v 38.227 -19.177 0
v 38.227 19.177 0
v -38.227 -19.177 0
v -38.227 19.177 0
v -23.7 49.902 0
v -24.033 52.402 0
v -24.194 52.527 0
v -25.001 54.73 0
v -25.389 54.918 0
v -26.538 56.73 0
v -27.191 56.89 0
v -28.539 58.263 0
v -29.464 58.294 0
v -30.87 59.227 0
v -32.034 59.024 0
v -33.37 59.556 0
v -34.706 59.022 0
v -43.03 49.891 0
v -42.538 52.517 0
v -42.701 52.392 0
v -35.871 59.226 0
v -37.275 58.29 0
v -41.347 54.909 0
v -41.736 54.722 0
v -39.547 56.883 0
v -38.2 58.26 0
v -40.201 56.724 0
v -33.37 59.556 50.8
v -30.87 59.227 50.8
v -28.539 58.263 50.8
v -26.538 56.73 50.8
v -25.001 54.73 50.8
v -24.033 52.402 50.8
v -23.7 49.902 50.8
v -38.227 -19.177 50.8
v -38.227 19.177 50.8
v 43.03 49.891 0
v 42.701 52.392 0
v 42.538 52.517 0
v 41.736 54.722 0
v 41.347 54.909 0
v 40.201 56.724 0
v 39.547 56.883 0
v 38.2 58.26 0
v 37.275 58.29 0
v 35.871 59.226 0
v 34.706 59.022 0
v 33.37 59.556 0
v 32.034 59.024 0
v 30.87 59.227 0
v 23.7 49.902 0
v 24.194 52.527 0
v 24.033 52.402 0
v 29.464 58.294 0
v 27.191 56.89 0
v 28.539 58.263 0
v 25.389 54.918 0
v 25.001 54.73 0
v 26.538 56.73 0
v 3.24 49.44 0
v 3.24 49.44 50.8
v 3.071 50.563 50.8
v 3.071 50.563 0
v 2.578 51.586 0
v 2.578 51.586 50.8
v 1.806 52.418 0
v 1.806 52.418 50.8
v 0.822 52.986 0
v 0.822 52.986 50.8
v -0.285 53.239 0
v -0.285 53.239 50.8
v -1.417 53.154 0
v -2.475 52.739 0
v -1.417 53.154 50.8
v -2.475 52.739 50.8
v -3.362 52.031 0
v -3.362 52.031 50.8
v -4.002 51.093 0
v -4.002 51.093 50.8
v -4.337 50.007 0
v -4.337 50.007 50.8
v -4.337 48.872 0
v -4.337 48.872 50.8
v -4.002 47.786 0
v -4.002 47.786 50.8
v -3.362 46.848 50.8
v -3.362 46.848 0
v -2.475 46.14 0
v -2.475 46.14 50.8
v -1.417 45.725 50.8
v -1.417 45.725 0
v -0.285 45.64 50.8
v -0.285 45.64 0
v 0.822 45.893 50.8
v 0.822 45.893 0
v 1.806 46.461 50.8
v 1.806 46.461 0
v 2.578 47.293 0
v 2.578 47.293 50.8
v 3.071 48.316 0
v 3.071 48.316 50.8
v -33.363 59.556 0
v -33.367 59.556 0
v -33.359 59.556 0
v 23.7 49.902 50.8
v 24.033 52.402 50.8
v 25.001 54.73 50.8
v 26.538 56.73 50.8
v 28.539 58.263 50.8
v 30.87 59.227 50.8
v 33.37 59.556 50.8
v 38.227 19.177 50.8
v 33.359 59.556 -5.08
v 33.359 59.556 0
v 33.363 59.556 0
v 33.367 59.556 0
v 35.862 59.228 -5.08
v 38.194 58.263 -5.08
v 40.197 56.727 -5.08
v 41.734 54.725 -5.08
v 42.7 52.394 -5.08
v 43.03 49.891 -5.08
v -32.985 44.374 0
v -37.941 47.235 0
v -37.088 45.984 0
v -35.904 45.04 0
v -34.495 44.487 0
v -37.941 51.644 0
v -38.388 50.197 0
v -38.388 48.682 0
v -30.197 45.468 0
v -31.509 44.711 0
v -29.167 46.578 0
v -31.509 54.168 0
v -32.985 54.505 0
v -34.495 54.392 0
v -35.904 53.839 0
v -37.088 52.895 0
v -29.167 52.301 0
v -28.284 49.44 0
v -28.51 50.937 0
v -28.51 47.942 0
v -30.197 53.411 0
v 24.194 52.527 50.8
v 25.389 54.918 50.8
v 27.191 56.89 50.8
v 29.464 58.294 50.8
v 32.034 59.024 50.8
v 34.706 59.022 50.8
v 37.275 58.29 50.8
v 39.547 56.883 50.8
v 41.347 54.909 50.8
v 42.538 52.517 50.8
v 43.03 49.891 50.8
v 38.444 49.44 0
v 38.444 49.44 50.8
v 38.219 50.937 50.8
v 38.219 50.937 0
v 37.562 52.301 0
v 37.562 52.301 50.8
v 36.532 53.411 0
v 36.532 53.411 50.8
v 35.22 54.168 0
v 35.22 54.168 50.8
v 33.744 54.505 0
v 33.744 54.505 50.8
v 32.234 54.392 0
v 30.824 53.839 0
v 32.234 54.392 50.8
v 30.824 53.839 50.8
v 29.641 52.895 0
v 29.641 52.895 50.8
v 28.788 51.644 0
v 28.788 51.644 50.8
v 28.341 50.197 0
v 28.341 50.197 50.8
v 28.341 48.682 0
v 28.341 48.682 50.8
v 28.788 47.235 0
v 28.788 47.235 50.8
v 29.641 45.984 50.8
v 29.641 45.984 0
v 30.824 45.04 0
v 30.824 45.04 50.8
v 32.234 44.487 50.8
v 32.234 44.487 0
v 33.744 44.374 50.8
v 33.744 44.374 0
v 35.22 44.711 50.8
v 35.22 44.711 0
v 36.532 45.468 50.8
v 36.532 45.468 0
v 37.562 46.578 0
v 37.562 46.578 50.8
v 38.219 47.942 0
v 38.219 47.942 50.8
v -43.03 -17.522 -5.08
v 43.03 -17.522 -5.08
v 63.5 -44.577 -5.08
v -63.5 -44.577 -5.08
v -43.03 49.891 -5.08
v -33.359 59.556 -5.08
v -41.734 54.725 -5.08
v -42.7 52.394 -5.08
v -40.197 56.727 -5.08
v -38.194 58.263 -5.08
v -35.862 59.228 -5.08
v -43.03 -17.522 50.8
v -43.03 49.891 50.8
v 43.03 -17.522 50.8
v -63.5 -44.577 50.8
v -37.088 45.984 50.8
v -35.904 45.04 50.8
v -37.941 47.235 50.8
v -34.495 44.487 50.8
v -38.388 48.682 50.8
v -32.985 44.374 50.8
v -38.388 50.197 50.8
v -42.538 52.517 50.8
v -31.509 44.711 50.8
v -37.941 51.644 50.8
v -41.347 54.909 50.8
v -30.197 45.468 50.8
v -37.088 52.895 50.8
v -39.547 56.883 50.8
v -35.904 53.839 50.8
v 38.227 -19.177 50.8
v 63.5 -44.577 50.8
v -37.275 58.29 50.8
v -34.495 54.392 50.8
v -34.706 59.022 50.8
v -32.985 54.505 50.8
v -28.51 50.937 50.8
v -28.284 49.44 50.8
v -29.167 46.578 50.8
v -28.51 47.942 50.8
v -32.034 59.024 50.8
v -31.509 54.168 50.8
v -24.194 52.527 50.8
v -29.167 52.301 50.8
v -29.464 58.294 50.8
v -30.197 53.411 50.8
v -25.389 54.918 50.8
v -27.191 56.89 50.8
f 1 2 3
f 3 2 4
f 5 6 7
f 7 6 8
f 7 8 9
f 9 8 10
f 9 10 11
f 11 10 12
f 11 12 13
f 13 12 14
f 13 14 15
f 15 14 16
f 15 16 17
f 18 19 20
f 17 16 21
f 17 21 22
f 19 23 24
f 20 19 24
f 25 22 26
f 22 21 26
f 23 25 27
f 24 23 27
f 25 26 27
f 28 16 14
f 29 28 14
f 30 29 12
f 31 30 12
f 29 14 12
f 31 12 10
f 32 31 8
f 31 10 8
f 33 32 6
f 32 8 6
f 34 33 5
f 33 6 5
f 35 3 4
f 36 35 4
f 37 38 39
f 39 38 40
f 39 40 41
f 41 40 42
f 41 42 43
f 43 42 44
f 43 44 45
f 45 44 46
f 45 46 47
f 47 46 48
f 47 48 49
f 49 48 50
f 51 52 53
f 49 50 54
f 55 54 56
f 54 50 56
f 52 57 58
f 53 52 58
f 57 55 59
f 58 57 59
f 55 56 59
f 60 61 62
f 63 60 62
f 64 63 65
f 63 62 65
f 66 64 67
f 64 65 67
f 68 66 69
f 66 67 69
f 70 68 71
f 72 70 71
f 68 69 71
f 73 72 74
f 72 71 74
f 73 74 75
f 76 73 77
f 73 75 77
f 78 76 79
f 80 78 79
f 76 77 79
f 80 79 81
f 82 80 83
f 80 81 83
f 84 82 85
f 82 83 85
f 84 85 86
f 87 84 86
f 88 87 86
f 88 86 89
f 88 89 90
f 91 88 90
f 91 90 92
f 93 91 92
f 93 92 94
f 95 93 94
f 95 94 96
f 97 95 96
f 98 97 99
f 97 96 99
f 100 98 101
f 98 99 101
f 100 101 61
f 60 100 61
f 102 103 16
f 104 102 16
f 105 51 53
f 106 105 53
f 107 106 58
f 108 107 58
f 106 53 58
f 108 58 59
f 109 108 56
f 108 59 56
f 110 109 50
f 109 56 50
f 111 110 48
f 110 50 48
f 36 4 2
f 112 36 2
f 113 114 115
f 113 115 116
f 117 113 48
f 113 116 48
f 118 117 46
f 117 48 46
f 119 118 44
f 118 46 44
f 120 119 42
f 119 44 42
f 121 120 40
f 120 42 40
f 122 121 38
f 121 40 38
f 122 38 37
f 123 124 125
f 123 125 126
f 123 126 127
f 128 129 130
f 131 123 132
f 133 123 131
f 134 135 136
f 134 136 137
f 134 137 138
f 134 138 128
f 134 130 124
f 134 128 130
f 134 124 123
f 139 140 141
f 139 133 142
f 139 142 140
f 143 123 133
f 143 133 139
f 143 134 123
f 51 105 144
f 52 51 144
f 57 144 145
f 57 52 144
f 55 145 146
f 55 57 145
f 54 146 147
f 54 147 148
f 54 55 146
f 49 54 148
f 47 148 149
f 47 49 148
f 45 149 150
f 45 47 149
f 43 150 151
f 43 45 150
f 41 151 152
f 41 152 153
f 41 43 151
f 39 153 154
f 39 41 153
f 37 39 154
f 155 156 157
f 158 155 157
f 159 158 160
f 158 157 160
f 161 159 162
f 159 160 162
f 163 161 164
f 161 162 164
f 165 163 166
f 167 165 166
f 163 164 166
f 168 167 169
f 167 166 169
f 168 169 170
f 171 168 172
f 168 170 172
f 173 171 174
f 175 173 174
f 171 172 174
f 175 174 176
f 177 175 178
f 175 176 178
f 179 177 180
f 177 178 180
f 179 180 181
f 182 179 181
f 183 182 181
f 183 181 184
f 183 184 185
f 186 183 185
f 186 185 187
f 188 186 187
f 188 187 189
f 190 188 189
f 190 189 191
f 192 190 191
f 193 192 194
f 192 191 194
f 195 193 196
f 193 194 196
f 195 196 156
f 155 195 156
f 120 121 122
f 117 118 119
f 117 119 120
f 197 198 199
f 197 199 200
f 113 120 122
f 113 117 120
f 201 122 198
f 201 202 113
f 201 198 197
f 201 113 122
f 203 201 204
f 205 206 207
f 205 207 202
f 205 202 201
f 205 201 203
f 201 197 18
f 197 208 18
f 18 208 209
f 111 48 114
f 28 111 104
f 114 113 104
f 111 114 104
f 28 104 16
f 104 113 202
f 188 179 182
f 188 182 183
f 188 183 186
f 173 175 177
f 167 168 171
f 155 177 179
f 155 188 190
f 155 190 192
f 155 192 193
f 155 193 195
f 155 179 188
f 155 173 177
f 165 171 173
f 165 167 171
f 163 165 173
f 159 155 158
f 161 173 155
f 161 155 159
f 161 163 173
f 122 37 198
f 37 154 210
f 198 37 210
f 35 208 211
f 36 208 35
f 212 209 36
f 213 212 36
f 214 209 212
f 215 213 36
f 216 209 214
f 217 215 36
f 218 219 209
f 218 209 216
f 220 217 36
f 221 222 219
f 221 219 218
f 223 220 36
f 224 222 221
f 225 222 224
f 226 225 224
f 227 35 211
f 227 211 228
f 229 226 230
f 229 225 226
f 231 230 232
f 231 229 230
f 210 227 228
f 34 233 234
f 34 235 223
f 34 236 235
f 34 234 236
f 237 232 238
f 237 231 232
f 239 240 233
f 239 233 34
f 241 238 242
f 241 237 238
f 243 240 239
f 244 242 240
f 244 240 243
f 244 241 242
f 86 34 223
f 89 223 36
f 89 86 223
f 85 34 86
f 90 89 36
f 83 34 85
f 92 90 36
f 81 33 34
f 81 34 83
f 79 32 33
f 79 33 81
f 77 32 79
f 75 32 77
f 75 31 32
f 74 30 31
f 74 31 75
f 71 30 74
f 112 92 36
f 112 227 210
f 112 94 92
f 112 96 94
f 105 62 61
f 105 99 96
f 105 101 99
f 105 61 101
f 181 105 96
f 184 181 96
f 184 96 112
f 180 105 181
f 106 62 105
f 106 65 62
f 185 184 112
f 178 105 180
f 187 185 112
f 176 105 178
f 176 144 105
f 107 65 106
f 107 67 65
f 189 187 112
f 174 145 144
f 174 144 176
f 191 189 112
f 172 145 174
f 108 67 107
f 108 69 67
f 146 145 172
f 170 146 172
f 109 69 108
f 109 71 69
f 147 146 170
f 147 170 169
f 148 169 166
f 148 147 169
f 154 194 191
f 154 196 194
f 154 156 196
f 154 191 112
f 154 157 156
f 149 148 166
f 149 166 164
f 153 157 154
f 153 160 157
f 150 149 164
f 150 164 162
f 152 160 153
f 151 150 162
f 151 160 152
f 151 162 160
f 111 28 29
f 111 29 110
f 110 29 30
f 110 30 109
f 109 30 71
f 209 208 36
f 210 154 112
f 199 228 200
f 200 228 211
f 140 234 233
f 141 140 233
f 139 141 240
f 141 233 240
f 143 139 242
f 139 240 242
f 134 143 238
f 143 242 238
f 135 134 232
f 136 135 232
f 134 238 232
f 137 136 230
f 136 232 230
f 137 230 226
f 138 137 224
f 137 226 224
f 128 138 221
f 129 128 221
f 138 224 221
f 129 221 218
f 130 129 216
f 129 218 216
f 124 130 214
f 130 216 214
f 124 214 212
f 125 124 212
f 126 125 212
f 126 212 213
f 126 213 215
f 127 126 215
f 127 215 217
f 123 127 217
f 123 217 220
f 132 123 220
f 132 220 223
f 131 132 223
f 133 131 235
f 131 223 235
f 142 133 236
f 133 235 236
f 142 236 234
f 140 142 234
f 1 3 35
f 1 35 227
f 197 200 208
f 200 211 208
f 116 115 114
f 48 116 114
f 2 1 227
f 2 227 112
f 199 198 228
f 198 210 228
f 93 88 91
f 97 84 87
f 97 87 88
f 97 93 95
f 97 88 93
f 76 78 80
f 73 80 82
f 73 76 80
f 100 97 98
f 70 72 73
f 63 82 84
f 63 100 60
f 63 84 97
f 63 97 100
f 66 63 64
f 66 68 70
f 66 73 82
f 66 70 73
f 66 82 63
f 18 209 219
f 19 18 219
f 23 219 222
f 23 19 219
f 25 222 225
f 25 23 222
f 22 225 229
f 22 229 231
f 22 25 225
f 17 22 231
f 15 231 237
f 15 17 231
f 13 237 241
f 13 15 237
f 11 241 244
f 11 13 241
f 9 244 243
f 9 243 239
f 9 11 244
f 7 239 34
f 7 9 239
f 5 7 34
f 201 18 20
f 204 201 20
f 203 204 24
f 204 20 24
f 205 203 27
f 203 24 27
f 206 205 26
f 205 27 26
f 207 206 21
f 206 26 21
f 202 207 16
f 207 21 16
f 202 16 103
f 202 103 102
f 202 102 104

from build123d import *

# Parameters (mm, degrees)
SKETCH1_R           = 4.862500054
SKETCH1_W           = 76.454
SKETCH1_H           = 38.354
BOSS_EXTRUDE1_DEPTH = 50.8
BOSS_EXTRUDE2_DEPTH = 5.08
BOSS_EXTRUDE3_DEPTH = 55.88
SKETCH4_R           = 3.429
CUT_EXTRUDE1_DEPTH  = 50.8
SKETCH5_R           = 3.81
CUT_EXTRUDE2_DEPTH  = 50.8
SKETCH6_R           = 5.08
CUT_EXTRUDE3_DEPTH  = 50.8


with BuildPart() as part:
    # Sketch1 → Boss-Extrude1 (new body)
    with BuildSketch(Plane.XY):
        with BuildLine():
            Line((-43.029964919, -17.522331458), (-43.029964919, 19.177))
            Line((-43.029964919, 19.177), (-43.029964919, 49.89109769))
            ThreePointArc((-43.029964919, 49.89109769), (-33.369881409, 59.115507734), (-23.699543278, 49.901848605))
            Line((-23.699543278, 49.901848605), (0, 24.257))
            Line((0, 24.257), (23.699543278, 49.901848605))
            ThreePointArc((23.699543278, 49.901848605), (33.369881409, 59.115507734), (43.029964919, 49.89109769))
            Line((43.029964919, 49.89109769), (43.029964919, 19.177))
            Line((43.029964919, 19.177), (43.029964919, -17.522331458))
            Line((43.029964919, -17.522331458), (63.5, -44.577))
            Line((63.5, -44.577), (-63.5, -44.577))
            Line((-63.5, -44.577), (-43.029964919, -17.522331458))
        make_face()
        with Locations((-33.364499946, 49.439500054)):
            Circle(SKETCH1_R, mode=Mode.SUBTRACT)
        with Locations(Location((33.364499946, 49.439500054, 0), (0, 0, 180))):
            Circle(SKETCH1_R, mode=Mode.SUBTRACT)
        Rectangle(SKETCH1_W, SKETCH1_H, mode=Mode.SUBTRACT)
    extrude(amount=BOSS_EXTRUDE1_DEPTH)

    # Sketch2 → Boss-Extrude2 (add)
    with BuildSketch(Plane(origin=(0, 0, 0), x_dir=(-1, 0, 0), z_dir=(0, 0, -1))):
        with BuildLine():
            Line((-43.029964919, 49.89109769), (-43.029964919, -17.522331458))
            Line((-43.029964919, -17.522331458), (-63.5, -44.577))
            Line((-63.5, -44.577), (63.5, -44.577))
            Line((63.5, -44.577), (43.029964919, -17.522331458))
            Line((43.029964919, -17.522331458), (43.029964919, 49.89109769))
            ThreePointArc((43.029964919, 49.89109769), (33.370126568, 59.556310005), (23.699543278, 49.901848605))
            Line((23.699543278, 49.901848605), (0, 24.257))
            Line((0, 24.257), (-23.699543278, 49.901848605))
            ThreePointArc((-23.699543278, 49.901848605), (-33.370126568, 59.556310005), (-43.029964919, 49.89109769))
        make_face()
    extrude(amount=BOSS_EXTRUDE2_DEPTH)

    # Sketch3 → Boss-Extrude3 (add)
    with BuildSketch(Plane(origin=(0, 0, -5.08), x_dir=(-1, 0, 0), z_dir=(0, 0, -1))):
        with BuildLine():
            Line((-33.370126568, 59.556310005), (33.370126568, 59.556310005))
            ThreePointArc((33.370126568, 59.556310005), (26.537689117, 56.729560126), (23.699543278, 49.901848605))
            Line((23.699543278, 49.901848605), (0, 24.257))
            Line((0, 24.257), (-23.699543278, 49.901848605))
            ThreePointArc((-23.699543278, 49.901848605), (-26.537689117, 56.729560126), (-33.370126568, 59.556310005))
        make_face()
    extrude(amount=-BOSS_EXTRUDE3_DEPTH)

    # Sketch4 → Cut-Extrude1 (cut)
    with BuildSketch(Plane.XY.offset(50.8)):
        with Locations((-0.569554056, 49.439500054)):
            Circle(SKETCH4_R)
    extrude(amount=-CUT_EXTRUDE1_DEPTH, mode=Mode.SUBTRACT)

    # Sketch5 → Cut-Extrude2 (cut)
    with BuildSketch(Plane.XY.offset(50.8)):
        with Locations((-0.569554056, 49.439500054)):
            Circle(SKETCH5_R)
    extrude(amount=-CUT_EXTRUDE2_DEPTH, mode=Mode.SUBTRACT)

    # Sketch6 → Cut-Extrude3 (cut)
    with BuildSketch(Plane.XY.offset(50.8)):
        with Locations((-33.364499946, 49.439500054)):
            Circle(SKETCH6_R)
        with Locations((33.364499946, 49.439500054)):
            Circle(SKETCH6_R)
    extrude(amount=-CUT_EXTRUDE3_DEPTH, mode=Mode.SUBTRACT)


solid = part.part
